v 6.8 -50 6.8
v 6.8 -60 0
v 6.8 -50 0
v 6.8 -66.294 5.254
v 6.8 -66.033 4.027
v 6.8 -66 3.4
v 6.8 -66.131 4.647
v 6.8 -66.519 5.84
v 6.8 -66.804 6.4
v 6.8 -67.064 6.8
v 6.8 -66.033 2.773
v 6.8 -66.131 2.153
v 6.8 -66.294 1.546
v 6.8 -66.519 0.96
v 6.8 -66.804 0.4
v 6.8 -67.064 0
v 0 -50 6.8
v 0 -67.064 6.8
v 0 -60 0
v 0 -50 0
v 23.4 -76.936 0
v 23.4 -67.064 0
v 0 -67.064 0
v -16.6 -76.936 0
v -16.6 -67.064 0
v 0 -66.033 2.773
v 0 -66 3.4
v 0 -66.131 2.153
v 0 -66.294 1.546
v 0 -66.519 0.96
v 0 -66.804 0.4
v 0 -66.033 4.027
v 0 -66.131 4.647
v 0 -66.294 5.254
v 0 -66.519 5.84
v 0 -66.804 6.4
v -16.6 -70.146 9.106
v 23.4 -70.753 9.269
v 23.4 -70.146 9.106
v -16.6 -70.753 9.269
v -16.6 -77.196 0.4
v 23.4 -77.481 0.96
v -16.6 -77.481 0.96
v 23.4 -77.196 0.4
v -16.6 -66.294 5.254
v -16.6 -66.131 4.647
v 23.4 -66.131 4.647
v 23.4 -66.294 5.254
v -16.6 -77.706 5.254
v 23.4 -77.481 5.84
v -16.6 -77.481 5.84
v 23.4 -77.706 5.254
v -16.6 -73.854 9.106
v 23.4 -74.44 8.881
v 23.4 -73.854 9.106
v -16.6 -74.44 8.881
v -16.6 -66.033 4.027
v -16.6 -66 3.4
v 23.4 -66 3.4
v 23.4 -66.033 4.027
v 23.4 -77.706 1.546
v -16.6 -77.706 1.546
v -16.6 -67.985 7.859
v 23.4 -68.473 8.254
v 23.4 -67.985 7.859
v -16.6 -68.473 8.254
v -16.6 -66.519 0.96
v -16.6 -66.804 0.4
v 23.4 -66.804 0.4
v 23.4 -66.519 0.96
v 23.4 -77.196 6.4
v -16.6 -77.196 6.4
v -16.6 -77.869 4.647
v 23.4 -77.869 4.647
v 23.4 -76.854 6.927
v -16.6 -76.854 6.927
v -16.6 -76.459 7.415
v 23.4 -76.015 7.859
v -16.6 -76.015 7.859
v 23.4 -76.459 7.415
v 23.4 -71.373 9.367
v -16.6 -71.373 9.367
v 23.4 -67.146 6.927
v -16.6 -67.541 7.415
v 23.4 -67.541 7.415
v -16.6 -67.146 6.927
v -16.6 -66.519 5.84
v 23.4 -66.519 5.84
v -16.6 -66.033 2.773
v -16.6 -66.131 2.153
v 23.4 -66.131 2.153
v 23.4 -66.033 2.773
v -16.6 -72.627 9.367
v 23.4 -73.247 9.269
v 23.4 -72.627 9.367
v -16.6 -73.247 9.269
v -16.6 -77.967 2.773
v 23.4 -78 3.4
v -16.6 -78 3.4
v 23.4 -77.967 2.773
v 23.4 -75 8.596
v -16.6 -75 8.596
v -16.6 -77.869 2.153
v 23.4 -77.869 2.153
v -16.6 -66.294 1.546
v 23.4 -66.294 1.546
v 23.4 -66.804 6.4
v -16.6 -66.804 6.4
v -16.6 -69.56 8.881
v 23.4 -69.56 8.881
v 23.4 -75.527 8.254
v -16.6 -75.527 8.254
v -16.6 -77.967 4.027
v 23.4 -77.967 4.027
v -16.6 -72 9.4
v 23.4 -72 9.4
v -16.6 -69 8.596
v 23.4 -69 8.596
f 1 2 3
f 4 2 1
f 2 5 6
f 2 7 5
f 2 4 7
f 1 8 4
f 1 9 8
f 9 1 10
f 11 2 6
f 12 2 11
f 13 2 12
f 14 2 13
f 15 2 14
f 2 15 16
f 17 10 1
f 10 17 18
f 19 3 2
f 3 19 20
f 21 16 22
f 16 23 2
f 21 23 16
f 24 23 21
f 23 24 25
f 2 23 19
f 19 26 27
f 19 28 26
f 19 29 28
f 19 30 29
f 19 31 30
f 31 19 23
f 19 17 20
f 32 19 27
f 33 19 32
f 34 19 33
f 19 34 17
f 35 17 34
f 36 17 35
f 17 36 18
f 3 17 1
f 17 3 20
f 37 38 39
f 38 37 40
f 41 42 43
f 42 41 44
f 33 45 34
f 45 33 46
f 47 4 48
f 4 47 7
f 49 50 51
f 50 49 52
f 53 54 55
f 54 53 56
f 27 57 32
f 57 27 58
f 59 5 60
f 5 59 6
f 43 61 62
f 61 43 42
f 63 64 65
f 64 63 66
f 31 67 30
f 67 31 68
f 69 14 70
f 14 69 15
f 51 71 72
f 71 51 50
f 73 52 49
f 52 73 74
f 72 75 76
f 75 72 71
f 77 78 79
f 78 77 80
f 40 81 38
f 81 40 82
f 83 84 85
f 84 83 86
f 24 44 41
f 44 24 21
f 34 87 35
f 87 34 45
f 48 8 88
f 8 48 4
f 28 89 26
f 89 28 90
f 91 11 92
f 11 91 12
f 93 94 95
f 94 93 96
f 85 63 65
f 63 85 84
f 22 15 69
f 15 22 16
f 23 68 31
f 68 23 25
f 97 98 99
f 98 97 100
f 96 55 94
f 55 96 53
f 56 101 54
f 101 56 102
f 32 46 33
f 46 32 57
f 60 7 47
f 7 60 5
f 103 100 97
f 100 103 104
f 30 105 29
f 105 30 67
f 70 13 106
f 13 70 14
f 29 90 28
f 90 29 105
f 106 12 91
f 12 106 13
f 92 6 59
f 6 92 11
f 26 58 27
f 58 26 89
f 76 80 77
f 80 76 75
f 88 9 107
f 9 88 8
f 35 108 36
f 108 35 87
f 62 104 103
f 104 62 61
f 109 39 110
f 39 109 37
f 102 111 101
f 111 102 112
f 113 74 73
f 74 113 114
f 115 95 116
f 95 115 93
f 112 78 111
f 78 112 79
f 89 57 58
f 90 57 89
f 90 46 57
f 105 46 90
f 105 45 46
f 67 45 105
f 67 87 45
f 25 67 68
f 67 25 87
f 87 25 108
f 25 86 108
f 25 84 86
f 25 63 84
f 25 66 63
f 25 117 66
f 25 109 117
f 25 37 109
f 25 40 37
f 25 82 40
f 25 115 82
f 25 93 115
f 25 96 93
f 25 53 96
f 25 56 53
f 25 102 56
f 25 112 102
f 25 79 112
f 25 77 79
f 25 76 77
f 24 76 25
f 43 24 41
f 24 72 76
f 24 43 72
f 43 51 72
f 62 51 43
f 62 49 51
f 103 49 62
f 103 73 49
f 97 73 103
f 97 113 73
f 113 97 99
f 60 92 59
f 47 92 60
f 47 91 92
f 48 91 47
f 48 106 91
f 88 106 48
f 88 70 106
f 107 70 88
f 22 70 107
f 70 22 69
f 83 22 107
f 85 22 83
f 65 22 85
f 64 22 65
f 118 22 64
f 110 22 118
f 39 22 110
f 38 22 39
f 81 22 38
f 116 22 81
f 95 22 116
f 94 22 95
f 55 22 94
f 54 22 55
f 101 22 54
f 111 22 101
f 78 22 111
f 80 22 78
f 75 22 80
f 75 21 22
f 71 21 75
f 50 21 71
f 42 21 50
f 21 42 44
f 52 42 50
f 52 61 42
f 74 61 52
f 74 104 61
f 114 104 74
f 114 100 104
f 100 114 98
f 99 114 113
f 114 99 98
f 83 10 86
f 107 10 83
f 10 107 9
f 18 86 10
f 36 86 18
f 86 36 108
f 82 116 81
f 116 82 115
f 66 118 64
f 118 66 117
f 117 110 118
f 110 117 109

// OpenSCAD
$fn=60;
nozzle=0.46;

module ring(x=10, d=7) {
    union() {
        rotate_extrude(convexity=7) {
            translate([x, 0, 0]) circle(d=d);
        }
        translate([0,0,-d/2]) cylinder(d=x*2, h=d);
    }
}

module ring2(d=14, h=5) {
    hull() {
        translate([0,0,-h/2]) cylinder(d=d-h/1.5, h=1);
        translate([0,0,-0.1]) cylinder(d=d, h=0.2);
        translate([0,0,0.1]) cylinder(d=d-h/1.5, h=h/2);
    }
}

module fin(nozzle=nozzle) {
    
   module sub() {
        rotate([0,0,50]) translate([13,10,0]) difference() {
            ring(x=8, d=11);
            ring(x=8, d=11-2*nozzle);
            translate([-20,1,-10]) cube([40,20,20]);
            translate([-9,-20,-10]) rotate([0,0,-20]) cube([20,40,20]);
            translate([-20,-20,-20]) cube([40,40,20]);
            cylinder(d=20.3, h=10);
        }
    }
    translate([0,0,-4.8]) sub();
    mirror([0,0,1]) translate([0,0,-4.8]) sub();
}

module outer(nozzle=nozzle) {
    difference() {
        ring(x=14, d=12);
        //ring(x=3, d=8);
        translate([0,0,-5]) cylinder(d=30,h=12);
        translate([0,0,-8]) cylinder(d=40,h=3.2);
        translate([0,0,4.8]) cylinder(d=40,h=6);
        rotate_extrude(convexity=7) {
            translate([23, 0, 0]) circle(d=10);
        }
    }
    for (i=[0:5]) {
        rotate([0,0,i*360/6]) translate([0,6,0]) fin(nozzle);
    }
}

module inner(d=22.1, cube_side=7) {
    difference() {
        ring2(d=22.1, h=9.6);
        cube([cube_side,cube_side,22], center=true);
    }
}

module key() {

    difference() {
        union() {
            cube([6.8, 20, 6.8]);
            translate([-20+3.4, -2, 3.4]) rotate([0,90,0]) cylinder(d=12, h=40);
        }
        translate([0,0,-2.5]) cube([50,20,5], center=true);
    }
}

//translate([20,0,0]) fin();
//outer();
//translate([30,0,0]) inner();

translate([0,-70,0]) key();
